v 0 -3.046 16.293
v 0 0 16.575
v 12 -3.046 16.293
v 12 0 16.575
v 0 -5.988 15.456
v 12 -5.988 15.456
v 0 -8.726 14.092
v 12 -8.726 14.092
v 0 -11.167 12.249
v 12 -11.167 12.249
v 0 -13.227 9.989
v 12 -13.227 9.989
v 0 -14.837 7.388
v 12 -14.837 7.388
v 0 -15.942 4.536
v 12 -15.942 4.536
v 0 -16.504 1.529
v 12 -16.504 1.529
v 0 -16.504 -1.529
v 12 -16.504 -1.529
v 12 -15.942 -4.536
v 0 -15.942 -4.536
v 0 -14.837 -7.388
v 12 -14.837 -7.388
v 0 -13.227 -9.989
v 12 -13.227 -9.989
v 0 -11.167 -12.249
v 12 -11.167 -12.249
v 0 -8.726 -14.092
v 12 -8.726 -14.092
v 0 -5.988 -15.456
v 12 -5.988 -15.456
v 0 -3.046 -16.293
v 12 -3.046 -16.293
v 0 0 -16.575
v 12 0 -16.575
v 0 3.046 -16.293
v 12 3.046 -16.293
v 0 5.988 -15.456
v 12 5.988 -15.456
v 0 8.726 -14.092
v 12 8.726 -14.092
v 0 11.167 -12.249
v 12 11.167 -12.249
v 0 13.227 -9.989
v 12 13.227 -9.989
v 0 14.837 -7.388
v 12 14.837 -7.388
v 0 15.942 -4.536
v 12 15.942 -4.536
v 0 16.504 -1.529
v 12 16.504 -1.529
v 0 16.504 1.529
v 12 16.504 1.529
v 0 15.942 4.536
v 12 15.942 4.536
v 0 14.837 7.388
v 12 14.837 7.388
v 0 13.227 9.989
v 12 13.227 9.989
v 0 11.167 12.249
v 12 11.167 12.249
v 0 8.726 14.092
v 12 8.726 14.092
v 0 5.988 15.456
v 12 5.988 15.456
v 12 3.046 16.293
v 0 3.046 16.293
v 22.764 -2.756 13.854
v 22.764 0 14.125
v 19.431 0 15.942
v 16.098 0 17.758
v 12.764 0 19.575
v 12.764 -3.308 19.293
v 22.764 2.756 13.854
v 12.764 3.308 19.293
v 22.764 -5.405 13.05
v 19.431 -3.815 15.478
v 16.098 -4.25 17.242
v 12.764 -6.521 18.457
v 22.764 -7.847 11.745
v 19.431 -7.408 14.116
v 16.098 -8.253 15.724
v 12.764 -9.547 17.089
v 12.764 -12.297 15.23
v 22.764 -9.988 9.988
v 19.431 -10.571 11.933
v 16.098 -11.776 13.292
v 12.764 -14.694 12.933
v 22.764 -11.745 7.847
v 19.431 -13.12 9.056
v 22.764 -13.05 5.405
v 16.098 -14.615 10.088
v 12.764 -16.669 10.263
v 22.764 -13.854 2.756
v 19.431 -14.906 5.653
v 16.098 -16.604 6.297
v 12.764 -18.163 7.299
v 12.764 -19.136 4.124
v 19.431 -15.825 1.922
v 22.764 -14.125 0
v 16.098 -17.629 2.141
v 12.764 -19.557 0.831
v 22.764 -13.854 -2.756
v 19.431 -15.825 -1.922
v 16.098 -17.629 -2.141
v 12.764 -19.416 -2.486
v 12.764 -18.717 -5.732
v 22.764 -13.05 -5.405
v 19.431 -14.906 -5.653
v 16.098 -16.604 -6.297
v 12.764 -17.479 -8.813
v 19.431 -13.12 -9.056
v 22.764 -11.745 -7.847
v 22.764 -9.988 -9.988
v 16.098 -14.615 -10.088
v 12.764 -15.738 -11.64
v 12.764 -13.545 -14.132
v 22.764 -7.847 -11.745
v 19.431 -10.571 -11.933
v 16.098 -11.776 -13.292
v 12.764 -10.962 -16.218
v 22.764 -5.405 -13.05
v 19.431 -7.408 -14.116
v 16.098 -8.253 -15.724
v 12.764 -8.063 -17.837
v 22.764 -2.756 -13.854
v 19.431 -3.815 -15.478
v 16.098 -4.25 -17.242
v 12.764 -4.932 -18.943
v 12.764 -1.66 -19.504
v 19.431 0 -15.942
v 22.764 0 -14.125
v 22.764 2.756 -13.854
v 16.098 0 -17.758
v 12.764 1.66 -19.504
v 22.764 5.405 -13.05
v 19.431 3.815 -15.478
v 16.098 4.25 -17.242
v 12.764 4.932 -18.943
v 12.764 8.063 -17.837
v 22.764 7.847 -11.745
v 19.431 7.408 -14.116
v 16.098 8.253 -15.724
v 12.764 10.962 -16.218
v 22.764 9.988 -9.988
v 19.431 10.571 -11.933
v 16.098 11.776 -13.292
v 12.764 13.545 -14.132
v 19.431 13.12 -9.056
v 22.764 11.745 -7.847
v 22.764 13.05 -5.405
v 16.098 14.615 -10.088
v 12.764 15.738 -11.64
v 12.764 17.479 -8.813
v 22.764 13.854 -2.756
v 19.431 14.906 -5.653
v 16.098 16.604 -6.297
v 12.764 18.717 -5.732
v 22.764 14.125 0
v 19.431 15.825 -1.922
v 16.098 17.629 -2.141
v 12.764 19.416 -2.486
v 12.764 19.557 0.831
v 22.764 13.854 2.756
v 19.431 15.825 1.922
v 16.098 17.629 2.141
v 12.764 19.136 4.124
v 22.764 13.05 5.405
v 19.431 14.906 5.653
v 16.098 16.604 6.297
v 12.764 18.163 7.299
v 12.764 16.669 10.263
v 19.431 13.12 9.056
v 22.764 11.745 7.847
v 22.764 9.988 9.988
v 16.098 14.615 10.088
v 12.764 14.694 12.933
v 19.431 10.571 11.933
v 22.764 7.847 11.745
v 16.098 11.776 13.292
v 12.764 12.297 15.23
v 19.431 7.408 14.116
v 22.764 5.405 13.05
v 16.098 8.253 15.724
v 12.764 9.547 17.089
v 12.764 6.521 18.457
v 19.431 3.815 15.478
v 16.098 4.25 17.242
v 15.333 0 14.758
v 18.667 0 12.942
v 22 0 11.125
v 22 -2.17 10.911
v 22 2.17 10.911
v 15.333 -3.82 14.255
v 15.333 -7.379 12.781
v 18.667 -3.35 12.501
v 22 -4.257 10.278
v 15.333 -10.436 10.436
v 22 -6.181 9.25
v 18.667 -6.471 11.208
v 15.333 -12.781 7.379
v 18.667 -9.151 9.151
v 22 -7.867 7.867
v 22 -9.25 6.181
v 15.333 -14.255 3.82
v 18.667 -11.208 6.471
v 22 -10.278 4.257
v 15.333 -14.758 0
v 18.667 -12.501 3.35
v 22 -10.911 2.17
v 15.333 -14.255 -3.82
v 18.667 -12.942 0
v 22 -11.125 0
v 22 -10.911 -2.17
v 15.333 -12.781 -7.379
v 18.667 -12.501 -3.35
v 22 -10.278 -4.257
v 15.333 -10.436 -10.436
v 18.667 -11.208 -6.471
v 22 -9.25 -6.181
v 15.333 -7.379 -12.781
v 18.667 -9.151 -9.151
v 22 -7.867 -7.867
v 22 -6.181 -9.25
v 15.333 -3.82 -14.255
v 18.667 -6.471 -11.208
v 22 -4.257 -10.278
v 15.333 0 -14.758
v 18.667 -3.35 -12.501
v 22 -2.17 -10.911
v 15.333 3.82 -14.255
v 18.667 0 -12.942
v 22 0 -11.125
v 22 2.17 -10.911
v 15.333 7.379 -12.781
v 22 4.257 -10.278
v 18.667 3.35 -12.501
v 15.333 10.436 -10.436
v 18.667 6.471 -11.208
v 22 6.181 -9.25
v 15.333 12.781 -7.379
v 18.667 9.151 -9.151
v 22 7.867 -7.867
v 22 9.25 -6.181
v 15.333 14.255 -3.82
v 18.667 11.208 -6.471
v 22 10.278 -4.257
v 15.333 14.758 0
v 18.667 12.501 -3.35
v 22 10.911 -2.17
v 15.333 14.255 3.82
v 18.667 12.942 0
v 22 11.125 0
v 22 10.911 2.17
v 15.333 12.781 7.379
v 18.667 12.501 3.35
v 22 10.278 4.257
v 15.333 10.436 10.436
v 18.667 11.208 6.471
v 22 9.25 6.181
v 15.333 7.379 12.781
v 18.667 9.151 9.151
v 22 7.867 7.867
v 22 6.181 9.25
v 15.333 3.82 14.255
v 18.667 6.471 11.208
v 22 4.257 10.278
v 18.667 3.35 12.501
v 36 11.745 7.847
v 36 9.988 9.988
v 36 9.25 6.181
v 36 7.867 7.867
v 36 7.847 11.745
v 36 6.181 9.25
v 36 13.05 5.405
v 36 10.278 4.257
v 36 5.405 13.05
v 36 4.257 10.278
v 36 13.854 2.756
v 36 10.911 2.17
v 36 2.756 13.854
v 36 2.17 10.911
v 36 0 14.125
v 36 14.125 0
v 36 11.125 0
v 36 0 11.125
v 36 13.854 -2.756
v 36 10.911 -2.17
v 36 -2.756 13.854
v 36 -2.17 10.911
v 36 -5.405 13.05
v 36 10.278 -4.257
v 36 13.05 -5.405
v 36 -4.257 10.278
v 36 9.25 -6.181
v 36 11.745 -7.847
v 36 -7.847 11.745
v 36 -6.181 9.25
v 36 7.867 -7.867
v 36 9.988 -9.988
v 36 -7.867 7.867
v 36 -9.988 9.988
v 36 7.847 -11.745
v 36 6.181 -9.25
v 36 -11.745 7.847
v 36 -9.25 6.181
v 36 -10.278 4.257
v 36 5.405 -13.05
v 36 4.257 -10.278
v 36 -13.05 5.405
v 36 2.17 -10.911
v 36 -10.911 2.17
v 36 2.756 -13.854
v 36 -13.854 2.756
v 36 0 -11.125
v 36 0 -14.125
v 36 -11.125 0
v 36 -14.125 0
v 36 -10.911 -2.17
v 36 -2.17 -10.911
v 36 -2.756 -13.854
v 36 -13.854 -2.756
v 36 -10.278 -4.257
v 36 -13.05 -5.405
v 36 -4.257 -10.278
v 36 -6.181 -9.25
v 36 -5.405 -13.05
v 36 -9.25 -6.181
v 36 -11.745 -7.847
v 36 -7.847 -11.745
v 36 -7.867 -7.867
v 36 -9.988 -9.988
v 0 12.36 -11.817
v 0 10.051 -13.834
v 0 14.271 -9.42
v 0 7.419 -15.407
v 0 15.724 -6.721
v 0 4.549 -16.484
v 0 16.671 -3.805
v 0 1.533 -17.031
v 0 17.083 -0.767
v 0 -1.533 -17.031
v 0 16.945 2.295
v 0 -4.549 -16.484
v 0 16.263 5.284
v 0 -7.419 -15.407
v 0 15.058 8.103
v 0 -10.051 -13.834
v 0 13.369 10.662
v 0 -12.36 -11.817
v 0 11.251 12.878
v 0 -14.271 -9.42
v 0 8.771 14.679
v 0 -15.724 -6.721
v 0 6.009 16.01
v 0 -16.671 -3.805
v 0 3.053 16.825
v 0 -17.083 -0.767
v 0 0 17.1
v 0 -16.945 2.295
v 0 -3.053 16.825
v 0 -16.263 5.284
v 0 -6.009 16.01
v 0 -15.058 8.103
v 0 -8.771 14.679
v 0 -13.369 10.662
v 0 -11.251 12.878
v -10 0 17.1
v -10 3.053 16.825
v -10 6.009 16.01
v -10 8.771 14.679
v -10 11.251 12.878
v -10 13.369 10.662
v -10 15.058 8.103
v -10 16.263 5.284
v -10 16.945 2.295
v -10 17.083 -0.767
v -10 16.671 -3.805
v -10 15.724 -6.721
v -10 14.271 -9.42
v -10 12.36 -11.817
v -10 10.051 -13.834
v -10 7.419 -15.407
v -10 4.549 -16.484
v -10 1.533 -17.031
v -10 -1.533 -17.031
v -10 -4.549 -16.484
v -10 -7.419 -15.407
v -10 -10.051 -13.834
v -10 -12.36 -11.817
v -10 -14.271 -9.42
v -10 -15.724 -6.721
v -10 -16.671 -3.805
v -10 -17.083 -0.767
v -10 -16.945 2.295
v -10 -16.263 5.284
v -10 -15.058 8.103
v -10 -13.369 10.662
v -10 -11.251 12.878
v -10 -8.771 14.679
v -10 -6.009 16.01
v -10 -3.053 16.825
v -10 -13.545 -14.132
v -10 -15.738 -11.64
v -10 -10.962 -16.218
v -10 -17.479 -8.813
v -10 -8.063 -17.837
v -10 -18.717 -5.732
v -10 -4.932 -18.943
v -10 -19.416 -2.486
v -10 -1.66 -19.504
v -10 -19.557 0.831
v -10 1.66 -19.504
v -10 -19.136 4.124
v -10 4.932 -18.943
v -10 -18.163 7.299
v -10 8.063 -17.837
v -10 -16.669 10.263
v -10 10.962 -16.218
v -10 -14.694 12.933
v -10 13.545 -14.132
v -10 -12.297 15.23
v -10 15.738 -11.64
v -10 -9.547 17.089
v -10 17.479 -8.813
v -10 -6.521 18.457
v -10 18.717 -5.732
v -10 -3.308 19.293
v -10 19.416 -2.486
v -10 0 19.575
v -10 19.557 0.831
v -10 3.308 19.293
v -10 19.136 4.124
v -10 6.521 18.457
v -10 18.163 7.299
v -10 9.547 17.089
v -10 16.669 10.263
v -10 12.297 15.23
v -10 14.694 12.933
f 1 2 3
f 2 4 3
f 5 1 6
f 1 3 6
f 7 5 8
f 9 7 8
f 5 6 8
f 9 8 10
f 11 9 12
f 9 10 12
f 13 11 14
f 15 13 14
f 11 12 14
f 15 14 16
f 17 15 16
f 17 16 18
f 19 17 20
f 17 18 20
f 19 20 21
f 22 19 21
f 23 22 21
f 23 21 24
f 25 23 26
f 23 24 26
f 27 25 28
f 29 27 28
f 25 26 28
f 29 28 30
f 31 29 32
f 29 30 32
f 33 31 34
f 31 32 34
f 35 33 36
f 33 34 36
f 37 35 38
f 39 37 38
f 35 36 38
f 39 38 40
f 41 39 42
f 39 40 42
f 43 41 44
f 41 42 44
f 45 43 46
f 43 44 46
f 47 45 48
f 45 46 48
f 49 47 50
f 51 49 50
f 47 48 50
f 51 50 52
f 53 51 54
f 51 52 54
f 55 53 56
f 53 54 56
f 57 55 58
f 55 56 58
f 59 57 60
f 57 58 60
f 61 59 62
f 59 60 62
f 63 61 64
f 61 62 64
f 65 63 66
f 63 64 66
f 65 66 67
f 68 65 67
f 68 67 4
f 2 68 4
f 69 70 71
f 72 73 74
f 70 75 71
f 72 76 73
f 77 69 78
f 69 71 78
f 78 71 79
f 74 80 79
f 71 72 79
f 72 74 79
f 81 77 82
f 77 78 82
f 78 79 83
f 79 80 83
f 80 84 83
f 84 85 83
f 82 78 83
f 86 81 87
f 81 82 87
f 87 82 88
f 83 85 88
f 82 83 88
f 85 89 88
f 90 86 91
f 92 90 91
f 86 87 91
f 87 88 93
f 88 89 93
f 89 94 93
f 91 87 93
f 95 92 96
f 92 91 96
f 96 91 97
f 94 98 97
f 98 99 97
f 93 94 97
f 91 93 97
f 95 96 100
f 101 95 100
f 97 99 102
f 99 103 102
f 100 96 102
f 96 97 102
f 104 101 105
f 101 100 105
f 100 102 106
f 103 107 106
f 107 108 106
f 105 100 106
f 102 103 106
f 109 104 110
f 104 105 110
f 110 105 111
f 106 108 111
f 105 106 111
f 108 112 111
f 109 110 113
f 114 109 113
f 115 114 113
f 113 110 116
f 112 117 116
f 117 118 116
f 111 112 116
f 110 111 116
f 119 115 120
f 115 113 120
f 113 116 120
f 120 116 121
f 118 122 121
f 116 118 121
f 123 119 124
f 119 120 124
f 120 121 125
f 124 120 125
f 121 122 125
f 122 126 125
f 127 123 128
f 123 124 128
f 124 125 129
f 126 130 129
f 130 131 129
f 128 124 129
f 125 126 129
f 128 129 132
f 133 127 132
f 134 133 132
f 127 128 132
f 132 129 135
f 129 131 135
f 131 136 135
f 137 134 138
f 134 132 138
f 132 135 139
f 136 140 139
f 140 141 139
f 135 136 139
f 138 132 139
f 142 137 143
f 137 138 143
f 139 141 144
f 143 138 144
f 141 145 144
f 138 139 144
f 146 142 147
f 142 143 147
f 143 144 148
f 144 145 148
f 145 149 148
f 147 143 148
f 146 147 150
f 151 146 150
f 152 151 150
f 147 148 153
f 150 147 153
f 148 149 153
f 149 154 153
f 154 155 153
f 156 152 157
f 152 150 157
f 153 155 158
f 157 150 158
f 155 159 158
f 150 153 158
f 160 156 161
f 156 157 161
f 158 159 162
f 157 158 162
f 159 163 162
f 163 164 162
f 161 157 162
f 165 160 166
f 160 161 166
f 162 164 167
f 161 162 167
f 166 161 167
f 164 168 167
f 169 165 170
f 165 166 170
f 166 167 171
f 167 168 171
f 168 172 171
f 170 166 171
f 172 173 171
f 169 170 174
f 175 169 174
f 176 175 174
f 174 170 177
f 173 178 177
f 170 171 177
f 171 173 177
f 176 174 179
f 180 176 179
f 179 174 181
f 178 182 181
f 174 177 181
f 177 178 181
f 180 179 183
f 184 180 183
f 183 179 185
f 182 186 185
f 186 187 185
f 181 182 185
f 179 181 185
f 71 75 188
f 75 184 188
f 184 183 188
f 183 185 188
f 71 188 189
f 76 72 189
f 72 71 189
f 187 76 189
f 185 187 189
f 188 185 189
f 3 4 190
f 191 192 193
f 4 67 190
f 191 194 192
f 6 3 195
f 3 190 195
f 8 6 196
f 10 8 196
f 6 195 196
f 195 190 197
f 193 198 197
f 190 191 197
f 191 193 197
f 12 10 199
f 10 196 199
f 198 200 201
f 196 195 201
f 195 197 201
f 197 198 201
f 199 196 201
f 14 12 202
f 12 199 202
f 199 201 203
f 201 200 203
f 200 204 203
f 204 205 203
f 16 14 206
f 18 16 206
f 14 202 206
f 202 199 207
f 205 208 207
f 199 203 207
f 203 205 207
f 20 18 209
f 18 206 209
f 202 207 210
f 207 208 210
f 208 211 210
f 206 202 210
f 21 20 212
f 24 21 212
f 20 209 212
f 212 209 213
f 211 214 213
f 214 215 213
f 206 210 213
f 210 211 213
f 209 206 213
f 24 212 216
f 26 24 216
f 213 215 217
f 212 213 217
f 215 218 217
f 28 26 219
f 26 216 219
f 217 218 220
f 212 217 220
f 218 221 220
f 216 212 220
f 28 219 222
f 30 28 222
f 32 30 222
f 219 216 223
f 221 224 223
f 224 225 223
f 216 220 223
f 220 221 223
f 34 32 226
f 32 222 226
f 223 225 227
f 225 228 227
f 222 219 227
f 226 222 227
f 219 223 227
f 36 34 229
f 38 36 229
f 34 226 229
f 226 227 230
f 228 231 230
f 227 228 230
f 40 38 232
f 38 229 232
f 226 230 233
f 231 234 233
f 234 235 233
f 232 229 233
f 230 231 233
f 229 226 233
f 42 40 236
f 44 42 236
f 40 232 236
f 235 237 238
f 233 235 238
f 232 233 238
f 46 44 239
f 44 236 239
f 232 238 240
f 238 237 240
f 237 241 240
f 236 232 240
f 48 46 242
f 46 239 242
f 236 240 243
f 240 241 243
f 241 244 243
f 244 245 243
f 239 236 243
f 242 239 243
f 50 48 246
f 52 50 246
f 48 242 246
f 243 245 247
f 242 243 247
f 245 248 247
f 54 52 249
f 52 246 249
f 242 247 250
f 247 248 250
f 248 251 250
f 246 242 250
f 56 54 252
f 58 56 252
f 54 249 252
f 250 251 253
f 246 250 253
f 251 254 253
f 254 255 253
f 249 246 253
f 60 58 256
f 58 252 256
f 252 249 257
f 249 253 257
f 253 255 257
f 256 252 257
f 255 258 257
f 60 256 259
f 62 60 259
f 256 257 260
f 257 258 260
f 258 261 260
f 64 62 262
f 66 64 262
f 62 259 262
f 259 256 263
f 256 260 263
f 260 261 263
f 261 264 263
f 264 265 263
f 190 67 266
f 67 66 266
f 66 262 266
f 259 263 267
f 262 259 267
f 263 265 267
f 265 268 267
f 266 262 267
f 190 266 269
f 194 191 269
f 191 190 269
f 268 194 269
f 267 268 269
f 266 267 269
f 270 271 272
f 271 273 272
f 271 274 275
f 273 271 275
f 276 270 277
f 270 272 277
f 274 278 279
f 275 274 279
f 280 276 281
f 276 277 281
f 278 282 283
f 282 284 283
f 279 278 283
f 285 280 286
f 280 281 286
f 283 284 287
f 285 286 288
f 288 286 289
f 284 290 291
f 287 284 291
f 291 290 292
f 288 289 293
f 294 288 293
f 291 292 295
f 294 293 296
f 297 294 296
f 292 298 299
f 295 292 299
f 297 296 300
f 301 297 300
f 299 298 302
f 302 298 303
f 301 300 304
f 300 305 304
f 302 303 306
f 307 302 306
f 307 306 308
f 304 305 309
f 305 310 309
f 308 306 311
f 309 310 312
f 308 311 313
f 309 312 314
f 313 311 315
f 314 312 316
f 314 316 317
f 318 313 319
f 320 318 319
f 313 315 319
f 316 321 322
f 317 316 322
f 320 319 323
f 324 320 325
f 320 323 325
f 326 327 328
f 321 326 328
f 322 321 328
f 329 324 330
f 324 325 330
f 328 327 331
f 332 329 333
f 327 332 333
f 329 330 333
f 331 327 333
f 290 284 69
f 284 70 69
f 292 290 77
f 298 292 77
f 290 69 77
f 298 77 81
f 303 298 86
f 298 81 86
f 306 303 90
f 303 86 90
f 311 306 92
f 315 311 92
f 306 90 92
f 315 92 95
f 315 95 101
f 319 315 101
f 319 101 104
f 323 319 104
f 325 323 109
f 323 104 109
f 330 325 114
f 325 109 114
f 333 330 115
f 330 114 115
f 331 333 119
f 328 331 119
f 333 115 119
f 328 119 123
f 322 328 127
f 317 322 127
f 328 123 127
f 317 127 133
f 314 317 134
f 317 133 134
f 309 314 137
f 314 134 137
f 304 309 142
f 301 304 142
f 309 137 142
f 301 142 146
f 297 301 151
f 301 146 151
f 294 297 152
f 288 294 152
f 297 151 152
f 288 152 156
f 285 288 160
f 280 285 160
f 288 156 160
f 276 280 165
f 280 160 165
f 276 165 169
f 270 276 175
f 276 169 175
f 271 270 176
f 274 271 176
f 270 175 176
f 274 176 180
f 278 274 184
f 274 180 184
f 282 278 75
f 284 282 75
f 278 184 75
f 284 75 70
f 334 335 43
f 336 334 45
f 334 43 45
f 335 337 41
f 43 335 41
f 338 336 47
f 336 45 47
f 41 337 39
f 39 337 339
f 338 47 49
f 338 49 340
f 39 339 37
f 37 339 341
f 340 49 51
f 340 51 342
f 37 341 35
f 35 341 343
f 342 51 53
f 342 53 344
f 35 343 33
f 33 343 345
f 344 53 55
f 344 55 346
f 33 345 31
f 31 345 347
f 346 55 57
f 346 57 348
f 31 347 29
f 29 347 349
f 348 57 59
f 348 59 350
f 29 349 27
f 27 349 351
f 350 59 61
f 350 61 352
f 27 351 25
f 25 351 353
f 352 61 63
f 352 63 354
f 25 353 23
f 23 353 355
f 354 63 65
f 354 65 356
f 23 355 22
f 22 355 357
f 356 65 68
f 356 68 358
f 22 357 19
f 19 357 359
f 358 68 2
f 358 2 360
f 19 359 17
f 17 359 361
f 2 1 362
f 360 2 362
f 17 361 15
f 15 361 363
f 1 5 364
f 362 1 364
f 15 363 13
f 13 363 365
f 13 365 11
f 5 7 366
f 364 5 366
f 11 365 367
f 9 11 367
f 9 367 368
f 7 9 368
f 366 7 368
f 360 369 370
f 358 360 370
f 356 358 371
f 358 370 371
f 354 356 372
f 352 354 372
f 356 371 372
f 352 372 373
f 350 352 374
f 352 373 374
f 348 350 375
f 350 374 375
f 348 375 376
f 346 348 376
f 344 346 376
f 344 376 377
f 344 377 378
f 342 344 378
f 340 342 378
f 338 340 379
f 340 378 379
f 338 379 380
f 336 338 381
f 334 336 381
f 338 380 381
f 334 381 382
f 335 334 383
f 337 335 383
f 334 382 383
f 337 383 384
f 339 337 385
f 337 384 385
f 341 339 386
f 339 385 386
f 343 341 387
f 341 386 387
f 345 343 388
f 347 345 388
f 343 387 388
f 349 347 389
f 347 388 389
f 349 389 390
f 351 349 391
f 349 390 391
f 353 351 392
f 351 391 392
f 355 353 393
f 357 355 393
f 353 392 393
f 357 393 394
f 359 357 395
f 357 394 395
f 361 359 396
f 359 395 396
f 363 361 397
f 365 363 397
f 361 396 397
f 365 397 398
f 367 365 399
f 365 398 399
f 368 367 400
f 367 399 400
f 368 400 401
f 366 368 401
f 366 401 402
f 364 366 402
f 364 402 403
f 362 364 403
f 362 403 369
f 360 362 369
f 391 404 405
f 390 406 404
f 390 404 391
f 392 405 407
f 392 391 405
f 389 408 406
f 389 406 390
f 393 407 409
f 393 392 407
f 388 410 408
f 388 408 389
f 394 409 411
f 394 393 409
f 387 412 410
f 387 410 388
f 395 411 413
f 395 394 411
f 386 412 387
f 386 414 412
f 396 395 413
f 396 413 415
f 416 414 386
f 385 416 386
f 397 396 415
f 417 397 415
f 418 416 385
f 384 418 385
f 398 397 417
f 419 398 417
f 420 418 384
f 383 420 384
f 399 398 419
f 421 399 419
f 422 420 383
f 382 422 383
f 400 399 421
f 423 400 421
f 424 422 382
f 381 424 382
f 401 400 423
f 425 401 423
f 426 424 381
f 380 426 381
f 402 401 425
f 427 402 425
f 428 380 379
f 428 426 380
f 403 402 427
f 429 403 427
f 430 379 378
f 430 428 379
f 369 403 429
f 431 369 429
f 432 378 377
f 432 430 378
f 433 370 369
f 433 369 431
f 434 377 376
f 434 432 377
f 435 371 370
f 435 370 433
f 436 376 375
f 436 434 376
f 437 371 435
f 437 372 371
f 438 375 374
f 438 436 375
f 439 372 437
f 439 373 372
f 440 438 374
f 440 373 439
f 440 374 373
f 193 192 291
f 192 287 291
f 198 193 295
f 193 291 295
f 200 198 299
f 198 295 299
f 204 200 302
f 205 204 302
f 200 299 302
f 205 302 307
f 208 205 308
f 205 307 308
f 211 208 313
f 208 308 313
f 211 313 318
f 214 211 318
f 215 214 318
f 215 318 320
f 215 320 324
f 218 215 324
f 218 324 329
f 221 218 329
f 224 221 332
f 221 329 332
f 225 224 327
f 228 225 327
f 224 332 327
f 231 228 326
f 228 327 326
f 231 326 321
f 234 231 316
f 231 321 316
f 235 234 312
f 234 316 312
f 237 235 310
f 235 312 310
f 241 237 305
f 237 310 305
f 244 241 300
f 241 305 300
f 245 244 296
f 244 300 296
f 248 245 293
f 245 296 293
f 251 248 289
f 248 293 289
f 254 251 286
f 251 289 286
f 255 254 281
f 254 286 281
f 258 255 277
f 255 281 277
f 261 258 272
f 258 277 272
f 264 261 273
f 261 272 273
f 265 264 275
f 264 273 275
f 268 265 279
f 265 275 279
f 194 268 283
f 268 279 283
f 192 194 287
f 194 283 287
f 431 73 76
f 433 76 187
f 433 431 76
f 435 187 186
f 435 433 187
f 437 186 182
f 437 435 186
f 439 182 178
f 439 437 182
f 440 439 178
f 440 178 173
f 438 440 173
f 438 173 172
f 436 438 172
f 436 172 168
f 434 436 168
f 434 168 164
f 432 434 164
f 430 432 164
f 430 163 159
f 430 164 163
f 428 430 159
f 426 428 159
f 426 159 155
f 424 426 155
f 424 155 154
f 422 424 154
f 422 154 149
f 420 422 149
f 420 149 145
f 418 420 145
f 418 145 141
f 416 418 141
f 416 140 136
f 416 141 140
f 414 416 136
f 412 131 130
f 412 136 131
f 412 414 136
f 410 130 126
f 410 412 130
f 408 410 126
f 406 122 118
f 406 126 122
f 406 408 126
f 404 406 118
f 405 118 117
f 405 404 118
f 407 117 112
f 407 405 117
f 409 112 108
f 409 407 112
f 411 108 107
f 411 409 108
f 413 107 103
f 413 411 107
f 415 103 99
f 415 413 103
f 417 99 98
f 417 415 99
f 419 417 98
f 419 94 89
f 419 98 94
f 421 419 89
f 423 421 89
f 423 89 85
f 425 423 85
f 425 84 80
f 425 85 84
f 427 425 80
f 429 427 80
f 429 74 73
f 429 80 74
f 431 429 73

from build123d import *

# Parameters (mm, degrees)
BOSS_EXTRUDE1_START = 10
SKETCH2_R           = 19.575
SKETCH2_R_2         = 17.1
BOSS_EXTRUDE1_DEPTH = 10


with BuildPart() as part:
    # Sketch1 → Revolve1 (revolve)
    with BuildSketch(Plane(origin=(0, 0, 0), x_dir=(1, 0, 0), z_dir=(0, 1, 0)), mode=Mode.PRIVATE) as revolve1_sk:
        Polygon((0, 16.575), (12, 16.575), (22, 11.125), (36, 11.125), (36, 14.125), (22.764422316, 14.125), (12.764422316, 19.575), (0, 19.575), align=None)
    revolve(revolve1_sk.sketch.rotate(Axis((0, 0, 0), (1, 0, 0)), 180), axis=Axis((0, 0, 0), (1, 0, 0)))

    # Sketch2 → Boss-Extrude1 (add)
    with BuildSketch(Plane.ZY.offset(BOSS_EXTRUDE1_START)):
        Circle(SKETCH2_R)
        Circle(SKETCH2_R_2, mode=Mode.SUBTRACT)
    extrude(amount=-BOSS_EXTRUDE1_DEPTH)


solid = part.part
